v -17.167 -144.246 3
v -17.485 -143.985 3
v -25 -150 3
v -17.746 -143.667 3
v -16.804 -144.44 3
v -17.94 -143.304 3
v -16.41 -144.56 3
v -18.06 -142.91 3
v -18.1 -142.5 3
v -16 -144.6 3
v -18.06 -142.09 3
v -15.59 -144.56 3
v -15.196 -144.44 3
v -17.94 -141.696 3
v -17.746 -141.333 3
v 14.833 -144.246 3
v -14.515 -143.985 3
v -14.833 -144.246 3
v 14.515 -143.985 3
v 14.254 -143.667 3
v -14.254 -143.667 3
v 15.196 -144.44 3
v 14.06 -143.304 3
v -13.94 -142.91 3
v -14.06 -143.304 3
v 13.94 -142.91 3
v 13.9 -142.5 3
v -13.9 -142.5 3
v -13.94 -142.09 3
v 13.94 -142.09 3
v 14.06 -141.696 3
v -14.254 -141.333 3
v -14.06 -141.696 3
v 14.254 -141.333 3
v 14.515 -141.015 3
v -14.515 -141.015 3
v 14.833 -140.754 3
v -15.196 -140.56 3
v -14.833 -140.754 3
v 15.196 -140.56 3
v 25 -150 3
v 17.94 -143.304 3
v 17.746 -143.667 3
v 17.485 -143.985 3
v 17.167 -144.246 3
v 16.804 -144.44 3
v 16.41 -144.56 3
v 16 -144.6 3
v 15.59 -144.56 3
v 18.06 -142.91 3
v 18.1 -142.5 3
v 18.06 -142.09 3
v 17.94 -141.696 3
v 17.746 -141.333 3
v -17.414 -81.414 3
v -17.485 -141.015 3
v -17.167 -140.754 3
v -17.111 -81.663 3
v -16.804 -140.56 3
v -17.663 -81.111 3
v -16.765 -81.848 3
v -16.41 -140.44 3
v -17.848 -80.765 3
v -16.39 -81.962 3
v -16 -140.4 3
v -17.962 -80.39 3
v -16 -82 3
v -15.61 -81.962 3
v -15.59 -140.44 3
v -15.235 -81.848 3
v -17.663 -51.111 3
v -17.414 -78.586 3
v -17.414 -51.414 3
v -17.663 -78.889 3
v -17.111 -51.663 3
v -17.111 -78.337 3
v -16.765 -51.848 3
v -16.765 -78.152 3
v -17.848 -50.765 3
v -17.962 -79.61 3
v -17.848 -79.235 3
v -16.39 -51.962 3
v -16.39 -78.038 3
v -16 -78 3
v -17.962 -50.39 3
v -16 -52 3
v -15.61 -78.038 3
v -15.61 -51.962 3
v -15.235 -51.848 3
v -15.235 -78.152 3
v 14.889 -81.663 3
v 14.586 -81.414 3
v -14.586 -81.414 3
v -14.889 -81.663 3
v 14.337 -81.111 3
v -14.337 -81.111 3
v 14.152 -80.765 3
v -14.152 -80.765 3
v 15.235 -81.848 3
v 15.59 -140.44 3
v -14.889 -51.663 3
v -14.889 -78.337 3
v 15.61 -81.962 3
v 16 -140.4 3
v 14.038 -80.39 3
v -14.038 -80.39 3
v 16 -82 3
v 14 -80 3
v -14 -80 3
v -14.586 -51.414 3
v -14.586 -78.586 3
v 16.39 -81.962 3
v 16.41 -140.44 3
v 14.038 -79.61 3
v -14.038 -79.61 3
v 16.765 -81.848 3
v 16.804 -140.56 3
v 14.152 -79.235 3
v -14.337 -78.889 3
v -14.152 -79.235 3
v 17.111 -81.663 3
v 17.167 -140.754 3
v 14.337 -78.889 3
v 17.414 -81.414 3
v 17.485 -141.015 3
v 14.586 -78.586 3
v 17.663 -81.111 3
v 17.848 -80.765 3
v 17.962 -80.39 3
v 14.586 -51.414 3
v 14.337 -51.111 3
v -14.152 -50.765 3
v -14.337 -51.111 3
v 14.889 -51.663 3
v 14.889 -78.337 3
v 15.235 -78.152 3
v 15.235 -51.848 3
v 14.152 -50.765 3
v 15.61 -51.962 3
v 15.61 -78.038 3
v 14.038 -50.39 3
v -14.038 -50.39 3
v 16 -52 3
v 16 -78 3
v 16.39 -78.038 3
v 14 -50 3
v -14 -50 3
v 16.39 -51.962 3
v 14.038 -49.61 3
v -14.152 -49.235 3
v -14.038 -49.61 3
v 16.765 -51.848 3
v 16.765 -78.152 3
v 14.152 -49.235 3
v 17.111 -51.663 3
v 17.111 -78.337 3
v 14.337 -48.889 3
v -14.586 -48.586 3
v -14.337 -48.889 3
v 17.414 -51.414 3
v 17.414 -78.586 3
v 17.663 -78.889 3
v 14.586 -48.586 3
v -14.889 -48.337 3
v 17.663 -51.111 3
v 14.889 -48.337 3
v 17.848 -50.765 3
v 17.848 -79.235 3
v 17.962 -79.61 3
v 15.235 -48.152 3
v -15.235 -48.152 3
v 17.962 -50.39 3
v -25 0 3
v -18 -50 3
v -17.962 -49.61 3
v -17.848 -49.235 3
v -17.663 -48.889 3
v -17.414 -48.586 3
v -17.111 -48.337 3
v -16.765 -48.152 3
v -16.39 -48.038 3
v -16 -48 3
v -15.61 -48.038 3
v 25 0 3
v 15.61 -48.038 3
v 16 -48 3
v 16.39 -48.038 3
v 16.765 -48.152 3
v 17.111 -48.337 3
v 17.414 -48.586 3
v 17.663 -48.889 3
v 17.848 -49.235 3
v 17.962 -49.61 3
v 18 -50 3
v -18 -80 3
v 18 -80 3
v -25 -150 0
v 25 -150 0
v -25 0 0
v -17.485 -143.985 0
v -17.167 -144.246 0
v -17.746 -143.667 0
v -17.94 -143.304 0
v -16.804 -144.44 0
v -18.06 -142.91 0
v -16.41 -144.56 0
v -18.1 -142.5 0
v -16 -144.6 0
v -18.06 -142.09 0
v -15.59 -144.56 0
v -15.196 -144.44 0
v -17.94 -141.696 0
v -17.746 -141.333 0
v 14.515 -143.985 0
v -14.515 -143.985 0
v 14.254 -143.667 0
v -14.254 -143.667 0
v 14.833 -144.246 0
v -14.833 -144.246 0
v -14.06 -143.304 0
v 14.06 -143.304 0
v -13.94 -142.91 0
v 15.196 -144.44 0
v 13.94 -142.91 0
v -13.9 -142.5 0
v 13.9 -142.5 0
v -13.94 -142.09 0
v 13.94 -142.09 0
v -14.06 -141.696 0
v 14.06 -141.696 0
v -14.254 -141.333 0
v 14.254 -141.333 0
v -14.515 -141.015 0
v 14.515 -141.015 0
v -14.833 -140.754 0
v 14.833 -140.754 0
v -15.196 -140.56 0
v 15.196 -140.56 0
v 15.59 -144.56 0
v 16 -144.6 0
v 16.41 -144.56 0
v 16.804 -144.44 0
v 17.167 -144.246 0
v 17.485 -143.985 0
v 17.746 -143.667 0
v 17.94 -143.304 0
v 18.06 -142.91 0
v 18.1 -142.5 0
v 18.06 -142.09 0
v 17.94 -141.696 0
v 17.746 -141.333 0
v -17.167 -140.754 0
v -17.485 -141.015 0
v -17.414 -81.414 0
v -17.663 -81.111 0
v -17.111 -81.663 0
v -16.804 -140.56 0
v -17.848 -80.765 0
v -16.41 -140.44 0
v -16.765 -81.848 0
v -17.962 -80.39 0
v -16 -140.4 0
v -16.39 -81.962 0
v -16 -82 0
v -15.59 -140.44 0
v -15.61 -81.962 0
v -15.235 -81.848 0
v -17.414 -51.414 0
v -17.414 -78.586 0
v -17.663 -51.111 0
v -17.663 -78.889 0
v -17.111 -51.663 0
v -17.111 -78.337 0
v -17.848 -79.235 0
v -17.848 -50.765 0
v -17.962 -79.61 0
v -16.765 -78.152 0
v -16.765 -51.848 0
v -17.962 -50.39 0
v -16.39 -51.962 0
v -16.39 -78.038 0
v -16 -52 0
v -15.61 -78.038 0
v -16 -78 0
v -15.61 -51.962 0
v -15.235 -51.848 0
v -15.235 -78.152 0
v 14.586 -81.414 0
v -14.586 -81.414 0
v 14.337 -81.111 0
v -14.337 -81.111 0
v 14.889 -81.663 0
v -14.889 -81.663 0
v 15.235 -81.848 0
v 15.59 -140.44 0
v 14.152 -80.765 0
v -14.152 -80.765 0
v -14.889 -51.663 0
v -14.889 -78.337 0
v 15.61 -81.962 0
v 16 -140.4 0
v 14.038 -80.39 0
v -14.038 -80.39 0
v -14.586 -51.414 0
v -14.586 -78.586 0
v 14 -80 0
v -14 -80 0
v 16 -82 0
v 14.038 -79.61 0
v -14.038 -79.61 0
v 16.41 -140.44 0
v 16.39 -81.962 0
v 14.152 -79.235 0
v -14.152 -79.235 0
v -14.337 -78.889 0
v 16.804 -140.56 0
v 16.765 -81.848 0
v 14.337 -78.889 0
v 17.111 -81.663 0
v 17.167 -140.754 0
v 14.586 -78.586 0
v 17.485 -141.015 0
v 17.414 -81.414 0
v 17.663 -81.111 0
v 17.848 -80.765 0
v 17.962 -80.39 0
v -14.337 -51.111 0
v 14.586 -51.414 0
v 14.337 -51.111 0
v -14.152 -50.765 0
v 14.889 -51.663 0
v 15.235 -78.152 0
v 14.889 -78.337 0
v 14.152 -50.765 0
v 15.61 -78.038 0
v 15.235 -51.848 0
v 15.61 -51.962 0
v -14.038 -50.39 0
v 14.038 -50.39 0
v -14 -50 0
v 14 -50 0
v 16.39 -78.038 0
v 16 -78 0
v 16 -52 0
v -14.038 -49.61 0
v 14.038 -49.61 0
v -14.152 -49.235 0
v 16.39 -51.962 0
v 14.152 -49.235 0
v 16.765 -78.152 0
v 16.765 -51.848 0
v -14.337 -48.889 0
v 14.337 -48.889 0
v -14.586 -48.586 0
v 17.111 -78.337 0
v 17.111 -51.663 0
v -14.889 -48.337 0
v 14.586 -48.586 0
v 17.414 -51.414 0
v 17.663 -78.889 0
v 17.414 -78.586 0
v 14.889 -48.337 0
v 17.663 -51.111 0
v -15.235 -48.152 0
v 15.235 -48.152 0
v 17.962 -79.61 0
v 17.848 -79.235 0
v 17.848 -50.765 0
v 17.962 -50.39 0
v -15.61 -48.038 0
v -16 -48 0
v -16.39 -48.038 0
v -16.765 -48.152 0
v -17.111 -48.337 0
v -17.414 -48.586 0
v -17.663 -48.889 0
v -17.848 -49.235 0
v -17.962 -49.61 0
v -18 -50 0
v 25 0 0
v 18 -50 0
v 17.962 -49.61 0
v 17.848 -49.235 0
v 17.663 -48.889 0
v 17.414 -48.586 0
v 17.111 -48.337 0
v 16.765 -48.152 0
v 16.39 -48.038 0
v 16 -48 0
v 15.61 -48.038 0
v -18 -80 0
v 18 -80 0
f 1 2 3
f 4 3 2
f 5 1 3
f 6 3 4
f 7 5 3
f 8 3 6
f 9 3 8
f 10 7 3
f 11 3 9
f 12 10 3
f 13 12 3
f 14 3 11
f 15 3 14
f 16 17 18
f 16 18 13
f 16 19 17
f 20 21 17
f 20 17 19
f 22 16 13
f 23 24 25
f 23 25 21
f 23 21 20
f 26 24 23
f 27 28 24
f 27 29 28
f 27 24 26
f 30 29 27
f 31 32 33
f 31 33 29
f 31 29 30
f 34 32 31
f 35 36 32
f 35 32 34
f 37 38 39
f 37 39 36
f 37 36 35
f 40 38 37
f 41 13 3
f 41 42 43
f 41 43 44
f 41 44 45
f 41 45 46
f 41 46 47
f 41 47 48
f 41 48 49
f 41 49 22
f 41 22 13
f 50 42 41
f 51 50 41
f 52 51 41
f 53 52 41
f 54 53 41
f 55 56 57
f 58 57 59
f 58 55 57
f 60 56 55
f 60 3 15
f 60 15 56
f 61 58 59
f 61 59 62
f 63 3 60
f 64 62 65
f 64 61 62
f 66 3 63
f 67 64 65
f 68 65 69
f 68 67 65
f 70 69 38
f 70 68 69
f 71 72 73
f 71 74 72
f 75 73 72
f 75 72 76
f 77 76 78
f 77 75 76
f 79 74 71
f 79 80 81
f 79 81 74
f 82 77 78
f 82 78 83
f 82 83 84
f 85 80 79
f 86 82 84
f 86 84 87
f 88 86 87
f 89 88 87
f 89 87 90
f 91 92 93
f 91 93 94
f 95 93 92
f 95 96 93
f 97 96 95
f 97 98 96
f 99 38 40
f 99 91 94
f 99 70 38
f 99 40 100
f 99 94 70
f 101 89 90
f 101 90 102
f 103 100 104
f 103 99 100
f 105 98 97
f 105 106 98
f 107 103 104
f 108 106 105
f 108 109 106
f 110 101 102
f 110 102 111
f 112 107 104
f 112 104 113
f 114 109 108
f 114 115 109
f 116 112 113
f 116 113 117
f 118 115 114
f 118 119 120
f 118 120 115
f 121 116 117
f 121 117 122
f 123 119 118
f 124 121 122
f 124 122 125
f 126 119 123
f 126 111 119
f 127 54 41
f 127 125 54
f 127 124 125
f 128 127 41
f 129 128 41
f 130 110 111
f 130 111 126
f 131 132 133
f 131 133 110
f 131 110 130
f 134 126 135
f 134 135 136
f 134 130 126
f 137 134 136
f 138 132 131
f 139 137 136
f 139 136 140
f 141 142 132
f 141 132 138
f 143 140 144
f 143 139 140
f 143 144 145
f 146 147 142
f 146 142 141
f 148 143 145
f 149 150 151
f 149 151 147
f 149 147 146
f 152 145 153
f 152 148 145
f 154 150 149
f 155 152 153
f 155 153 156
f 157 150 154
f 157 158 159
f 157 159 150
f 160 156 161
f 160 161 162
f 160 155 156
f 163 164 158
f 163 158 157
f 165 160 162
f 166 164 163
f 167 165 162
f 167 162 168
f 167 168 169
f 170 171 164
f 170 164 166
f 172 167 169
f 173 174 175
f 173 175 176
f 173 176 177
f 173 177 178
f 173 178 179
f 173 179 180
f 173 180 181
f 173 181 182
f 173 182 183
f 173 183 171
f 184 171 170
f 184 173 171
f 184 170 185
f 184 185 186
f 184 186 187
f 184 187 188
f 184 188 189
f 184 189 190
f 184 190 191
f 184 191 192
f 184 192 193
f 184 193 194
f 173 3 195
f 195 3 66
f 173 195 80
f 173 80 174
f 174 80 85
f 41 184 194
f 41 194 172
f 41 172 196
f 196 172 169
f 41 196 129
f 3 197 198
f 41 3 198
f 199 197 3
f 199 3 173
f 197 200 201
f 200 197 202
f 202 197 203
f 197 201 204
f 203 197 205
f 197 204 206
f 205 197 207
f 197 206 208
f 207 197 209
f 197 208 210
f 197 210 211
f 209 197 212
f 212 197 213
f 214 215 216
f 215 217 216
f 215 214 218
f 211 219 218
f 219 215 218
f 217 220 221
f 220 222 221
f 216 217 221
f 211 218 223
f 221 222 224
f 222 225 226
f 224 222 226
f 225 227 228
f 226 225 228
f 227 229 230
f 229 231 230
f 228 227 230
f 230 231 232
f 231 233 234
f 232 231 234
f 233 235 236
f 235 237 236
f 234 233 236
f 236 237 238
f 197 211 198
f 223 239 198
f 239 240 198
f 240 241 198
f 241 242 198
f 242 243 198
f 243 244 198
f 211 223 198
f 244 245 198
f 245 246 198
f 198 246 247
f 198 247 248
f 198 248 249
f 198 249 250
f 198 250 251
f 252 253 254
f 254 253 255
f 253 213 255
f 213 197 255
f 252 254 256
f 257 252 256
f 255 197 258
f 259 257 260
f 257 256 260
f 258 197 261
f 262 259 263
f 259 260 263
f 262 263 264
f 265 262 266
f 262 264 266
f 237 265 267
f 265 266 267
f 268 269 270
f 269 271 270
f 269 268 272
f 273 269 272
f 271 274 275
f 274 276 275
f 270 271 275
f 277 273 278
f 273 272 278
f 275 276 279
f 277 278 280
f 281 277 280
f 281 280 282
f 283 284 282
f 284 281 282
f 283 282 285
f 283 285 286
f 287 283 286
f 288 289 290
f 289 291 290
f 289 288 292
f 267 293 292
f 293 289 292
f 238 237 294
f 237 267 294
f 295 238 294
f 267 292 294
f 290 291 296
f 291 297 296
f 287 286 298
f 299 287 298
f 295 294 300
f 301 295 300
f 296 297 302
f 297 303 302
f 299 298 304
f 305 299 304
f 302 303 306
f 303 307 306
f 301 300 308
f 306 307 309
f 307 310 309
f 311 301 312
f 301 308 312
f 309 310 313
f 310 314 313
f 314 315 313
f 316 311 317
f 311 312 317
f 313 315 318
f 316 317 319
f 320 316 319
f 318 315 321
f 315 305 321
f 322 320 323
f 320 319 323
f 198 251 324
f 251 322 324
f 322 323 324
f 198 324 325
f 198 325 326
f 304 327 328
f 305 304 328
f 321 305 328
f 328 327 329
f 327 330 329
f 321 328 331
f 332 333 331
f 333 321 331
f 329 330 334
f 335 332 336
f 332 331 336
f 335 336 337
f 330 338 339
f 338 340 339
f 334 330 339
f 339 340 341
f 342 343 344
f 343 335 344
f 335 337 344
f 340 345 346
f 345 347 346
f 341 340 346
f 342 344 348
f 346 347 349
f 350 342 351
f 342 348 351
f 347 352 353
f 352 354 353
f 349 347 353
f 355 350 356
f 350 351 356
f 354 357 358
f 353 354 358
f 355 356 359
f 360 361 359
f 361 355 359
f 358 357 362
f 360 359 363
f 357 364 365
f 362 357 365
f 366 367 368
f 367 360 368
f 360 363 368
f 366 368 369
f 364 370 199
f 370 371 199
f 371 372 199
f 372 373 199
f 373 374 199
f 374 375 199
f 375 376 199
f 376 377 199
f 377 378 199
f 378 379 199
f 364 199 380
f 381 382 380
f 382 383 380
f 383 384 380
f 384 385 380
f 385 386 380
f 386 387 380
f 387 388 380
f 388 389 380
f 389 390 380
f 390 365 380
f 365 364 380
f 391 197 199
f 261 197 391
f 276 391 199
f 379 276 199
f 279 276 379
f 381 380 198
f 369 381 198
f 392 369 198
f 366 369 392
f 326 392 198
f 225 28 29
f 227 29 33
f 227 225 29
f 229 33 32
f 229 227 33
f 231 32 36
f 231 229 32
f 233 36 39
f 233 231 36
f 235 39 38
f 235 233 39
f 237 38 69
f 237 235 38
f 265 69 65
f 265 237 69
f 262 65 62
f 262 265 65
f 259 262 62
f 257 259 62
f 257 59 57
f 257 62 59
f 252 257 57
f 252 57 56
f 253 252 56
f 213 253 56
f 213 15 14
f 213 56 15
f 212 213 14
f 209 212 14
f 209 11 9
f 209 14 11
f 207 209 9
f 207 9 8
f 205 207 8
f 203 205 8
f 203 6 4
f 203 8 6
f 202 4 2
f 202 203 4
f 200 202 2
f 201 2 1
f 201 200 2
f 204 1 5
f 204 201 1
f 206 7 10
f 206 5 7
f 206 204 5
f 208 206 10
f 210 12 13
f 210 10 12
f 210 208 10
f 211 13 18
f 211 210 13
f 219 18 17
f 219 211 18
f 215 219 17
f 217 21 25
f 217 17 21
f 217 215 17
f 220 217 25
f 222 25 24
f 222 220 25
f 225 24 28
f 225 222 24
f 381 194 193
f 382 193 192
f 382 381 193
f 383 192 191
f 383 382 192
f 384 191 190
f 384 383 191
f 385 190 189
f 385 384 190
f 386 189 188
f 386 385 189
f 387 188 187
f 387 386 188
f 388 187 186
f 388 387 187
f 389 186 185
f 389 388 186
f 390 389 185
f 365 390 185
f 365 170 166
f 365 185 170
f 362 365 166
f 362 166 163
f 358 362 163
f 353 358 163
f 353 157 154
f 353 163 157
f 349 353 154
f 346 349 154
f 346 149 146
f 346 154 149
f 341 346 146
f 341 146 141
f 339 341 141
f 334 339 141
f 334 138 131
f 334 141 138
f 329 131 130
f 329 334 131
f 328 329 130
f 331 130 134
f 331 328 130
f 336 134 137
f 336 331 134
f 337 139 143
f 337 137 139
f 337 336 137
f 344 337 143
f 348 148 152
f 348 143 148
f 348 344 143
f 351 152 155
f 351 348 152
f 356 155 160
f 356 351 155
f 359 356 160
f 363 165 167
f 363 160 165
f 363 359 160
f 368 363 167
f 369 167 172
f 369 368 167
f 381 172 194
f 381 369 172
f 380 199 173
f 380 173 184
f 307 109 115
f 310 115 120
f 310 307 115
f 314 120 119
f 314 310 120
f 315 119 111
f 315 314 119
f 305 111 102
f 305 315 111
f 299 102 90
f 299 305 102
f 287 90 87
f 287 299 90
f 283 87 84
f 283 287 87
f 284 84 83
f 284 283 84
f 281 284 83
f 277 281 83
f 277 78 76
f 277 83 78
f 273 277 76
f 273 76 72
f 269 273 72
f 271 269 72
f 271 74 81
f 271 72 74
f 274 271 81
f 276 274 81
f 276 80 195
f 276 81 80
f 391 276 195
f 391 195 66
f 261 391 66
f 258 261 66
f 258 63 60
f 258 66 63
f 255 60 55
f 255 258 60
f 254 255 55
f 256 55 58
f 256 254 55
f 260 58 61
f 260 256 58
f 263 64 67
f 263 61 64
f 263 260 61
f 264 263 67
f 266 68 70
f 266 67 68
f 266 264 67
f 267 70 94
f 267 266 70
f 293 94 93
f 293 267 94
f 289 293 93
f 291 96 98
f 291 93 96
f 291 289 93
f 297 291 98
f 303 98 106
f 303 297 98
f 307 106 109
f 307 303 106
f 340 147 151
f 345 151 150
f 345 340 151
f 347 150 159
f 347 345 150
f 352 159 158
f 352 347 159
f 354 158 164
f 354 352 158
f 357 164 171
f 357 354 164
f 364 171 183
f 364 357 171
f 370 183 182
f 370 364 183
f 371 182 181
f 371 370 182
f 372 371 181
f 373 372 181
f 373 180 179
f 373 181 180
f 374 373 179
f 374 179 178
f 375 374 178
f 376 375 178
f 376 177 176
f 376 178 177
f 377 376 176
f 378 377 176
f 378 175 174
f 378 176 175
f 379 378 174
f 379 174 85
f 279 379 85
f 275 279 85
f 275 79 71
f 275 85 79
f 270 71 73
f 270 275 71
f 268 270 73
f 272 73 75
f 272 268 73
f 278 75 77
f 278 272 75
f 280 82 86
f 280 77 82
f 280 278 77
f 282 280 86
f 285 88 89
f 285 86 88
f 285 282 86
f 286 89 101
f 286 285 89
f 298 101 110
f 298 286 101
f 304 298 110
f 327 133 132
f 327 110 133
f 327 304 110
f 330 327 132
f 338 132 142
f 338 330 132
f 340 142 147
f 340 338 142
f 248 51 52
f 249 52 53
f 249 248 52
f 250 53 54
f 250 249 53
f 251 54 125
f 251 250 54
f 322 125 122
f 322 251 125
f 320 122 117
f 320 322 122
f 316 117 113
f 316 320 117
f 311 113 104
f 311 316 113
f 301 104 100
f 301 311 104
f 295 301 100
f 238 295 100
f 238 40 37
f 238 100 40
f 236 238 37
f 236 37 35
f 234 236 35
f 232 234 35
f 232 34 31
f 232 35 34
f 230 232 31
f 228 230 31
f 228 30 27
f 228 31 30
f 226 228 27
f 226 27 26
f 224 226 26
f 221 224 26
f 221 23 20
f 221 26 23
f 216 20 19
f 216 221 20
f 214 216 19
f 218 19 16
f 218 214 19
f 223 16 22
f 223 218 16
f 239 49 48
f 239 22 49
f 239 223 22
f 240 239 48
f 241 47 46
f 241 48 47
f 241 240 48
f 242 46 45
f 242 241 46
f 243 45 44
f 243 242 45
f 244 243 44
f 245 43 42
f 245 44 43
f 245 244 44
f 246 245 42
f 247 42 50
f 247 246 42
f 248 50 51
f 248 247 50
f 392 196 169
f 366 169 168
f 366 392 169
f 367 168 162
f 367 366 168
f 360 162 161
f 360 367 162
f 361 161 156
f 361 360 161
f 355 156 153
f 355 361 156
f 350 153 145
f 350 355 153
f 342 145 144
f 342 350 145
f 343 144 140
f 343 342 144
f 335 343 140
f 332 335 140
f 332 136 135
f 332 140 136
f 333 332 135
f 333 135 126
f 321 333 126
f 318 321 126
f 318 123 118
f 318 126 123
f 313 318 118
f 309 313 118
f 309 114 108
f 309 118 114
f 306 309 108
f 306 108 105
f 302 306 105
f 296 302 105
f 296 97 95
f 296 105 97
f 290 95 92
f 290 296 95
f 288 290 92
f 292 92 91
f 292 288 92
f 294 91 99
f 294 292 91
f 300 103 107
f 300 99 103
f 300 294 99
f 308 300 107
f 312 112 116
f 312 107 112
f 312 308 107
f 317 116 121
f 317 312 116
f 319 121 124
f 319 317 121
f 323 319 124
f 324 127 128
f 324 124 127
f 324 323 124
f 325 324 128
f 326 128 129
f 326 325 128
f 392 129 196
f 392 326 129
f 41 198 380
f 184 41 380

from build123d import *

# Parameters (mm, degrees)
SKETCH1_W           = 50
SKETCH1_H           = 150
BOSS_EXTRUDE1_DEPTH = 3
SKETCH2_R           = 2
CUT_EXTRUDE2_DEPTH  = 4
SKETCH3_R           = 2.1
CUT_EXTRUDE4_DEPTH  = 4


with BuildPart() as part:
    # Sketch1 → Boss-Extrude1 (new body)
    with BuildSketch(Plane.XY):
        with Locations((0, -75)):
            Rectangle(SKETCH1_W, SKETCH1_H)
    extrude(amount=BOSS_EXTRUDE1_DEPTH)

    # Sketch2 → Cut-Extrude2 (cut, through all)
    with BuildSketch(Plane.XY):
        with Locations((-16, -50)):
            Circle(SKETCH2_R)
        with Locations((16, -50)):
            Circle(SKETCH2_R)
        with Locations((-16, -80)):
            Circle(SKETCH2_R)
        with Locations((16, -80)):
            Circle(SKETCH2_R)
    extrude(amount=CUT_EXTRUDE2_DEPTH, mode=Mode.SUBTRACT)

    # Sketch3 → Cut-Extrude4 (cut, through all)
    with BuildSketch(Plane.XY):
        with Locations((-16, -142.5)):
            Circle(SKETCH3_R)
        with Locations((16, -142.5)):
            Circle(SKETCH3_R)
    extrude(amount=CUT_EXTRUDE4_DEPTH, mode=Mode.SUBTRACT)


solid = part.part
